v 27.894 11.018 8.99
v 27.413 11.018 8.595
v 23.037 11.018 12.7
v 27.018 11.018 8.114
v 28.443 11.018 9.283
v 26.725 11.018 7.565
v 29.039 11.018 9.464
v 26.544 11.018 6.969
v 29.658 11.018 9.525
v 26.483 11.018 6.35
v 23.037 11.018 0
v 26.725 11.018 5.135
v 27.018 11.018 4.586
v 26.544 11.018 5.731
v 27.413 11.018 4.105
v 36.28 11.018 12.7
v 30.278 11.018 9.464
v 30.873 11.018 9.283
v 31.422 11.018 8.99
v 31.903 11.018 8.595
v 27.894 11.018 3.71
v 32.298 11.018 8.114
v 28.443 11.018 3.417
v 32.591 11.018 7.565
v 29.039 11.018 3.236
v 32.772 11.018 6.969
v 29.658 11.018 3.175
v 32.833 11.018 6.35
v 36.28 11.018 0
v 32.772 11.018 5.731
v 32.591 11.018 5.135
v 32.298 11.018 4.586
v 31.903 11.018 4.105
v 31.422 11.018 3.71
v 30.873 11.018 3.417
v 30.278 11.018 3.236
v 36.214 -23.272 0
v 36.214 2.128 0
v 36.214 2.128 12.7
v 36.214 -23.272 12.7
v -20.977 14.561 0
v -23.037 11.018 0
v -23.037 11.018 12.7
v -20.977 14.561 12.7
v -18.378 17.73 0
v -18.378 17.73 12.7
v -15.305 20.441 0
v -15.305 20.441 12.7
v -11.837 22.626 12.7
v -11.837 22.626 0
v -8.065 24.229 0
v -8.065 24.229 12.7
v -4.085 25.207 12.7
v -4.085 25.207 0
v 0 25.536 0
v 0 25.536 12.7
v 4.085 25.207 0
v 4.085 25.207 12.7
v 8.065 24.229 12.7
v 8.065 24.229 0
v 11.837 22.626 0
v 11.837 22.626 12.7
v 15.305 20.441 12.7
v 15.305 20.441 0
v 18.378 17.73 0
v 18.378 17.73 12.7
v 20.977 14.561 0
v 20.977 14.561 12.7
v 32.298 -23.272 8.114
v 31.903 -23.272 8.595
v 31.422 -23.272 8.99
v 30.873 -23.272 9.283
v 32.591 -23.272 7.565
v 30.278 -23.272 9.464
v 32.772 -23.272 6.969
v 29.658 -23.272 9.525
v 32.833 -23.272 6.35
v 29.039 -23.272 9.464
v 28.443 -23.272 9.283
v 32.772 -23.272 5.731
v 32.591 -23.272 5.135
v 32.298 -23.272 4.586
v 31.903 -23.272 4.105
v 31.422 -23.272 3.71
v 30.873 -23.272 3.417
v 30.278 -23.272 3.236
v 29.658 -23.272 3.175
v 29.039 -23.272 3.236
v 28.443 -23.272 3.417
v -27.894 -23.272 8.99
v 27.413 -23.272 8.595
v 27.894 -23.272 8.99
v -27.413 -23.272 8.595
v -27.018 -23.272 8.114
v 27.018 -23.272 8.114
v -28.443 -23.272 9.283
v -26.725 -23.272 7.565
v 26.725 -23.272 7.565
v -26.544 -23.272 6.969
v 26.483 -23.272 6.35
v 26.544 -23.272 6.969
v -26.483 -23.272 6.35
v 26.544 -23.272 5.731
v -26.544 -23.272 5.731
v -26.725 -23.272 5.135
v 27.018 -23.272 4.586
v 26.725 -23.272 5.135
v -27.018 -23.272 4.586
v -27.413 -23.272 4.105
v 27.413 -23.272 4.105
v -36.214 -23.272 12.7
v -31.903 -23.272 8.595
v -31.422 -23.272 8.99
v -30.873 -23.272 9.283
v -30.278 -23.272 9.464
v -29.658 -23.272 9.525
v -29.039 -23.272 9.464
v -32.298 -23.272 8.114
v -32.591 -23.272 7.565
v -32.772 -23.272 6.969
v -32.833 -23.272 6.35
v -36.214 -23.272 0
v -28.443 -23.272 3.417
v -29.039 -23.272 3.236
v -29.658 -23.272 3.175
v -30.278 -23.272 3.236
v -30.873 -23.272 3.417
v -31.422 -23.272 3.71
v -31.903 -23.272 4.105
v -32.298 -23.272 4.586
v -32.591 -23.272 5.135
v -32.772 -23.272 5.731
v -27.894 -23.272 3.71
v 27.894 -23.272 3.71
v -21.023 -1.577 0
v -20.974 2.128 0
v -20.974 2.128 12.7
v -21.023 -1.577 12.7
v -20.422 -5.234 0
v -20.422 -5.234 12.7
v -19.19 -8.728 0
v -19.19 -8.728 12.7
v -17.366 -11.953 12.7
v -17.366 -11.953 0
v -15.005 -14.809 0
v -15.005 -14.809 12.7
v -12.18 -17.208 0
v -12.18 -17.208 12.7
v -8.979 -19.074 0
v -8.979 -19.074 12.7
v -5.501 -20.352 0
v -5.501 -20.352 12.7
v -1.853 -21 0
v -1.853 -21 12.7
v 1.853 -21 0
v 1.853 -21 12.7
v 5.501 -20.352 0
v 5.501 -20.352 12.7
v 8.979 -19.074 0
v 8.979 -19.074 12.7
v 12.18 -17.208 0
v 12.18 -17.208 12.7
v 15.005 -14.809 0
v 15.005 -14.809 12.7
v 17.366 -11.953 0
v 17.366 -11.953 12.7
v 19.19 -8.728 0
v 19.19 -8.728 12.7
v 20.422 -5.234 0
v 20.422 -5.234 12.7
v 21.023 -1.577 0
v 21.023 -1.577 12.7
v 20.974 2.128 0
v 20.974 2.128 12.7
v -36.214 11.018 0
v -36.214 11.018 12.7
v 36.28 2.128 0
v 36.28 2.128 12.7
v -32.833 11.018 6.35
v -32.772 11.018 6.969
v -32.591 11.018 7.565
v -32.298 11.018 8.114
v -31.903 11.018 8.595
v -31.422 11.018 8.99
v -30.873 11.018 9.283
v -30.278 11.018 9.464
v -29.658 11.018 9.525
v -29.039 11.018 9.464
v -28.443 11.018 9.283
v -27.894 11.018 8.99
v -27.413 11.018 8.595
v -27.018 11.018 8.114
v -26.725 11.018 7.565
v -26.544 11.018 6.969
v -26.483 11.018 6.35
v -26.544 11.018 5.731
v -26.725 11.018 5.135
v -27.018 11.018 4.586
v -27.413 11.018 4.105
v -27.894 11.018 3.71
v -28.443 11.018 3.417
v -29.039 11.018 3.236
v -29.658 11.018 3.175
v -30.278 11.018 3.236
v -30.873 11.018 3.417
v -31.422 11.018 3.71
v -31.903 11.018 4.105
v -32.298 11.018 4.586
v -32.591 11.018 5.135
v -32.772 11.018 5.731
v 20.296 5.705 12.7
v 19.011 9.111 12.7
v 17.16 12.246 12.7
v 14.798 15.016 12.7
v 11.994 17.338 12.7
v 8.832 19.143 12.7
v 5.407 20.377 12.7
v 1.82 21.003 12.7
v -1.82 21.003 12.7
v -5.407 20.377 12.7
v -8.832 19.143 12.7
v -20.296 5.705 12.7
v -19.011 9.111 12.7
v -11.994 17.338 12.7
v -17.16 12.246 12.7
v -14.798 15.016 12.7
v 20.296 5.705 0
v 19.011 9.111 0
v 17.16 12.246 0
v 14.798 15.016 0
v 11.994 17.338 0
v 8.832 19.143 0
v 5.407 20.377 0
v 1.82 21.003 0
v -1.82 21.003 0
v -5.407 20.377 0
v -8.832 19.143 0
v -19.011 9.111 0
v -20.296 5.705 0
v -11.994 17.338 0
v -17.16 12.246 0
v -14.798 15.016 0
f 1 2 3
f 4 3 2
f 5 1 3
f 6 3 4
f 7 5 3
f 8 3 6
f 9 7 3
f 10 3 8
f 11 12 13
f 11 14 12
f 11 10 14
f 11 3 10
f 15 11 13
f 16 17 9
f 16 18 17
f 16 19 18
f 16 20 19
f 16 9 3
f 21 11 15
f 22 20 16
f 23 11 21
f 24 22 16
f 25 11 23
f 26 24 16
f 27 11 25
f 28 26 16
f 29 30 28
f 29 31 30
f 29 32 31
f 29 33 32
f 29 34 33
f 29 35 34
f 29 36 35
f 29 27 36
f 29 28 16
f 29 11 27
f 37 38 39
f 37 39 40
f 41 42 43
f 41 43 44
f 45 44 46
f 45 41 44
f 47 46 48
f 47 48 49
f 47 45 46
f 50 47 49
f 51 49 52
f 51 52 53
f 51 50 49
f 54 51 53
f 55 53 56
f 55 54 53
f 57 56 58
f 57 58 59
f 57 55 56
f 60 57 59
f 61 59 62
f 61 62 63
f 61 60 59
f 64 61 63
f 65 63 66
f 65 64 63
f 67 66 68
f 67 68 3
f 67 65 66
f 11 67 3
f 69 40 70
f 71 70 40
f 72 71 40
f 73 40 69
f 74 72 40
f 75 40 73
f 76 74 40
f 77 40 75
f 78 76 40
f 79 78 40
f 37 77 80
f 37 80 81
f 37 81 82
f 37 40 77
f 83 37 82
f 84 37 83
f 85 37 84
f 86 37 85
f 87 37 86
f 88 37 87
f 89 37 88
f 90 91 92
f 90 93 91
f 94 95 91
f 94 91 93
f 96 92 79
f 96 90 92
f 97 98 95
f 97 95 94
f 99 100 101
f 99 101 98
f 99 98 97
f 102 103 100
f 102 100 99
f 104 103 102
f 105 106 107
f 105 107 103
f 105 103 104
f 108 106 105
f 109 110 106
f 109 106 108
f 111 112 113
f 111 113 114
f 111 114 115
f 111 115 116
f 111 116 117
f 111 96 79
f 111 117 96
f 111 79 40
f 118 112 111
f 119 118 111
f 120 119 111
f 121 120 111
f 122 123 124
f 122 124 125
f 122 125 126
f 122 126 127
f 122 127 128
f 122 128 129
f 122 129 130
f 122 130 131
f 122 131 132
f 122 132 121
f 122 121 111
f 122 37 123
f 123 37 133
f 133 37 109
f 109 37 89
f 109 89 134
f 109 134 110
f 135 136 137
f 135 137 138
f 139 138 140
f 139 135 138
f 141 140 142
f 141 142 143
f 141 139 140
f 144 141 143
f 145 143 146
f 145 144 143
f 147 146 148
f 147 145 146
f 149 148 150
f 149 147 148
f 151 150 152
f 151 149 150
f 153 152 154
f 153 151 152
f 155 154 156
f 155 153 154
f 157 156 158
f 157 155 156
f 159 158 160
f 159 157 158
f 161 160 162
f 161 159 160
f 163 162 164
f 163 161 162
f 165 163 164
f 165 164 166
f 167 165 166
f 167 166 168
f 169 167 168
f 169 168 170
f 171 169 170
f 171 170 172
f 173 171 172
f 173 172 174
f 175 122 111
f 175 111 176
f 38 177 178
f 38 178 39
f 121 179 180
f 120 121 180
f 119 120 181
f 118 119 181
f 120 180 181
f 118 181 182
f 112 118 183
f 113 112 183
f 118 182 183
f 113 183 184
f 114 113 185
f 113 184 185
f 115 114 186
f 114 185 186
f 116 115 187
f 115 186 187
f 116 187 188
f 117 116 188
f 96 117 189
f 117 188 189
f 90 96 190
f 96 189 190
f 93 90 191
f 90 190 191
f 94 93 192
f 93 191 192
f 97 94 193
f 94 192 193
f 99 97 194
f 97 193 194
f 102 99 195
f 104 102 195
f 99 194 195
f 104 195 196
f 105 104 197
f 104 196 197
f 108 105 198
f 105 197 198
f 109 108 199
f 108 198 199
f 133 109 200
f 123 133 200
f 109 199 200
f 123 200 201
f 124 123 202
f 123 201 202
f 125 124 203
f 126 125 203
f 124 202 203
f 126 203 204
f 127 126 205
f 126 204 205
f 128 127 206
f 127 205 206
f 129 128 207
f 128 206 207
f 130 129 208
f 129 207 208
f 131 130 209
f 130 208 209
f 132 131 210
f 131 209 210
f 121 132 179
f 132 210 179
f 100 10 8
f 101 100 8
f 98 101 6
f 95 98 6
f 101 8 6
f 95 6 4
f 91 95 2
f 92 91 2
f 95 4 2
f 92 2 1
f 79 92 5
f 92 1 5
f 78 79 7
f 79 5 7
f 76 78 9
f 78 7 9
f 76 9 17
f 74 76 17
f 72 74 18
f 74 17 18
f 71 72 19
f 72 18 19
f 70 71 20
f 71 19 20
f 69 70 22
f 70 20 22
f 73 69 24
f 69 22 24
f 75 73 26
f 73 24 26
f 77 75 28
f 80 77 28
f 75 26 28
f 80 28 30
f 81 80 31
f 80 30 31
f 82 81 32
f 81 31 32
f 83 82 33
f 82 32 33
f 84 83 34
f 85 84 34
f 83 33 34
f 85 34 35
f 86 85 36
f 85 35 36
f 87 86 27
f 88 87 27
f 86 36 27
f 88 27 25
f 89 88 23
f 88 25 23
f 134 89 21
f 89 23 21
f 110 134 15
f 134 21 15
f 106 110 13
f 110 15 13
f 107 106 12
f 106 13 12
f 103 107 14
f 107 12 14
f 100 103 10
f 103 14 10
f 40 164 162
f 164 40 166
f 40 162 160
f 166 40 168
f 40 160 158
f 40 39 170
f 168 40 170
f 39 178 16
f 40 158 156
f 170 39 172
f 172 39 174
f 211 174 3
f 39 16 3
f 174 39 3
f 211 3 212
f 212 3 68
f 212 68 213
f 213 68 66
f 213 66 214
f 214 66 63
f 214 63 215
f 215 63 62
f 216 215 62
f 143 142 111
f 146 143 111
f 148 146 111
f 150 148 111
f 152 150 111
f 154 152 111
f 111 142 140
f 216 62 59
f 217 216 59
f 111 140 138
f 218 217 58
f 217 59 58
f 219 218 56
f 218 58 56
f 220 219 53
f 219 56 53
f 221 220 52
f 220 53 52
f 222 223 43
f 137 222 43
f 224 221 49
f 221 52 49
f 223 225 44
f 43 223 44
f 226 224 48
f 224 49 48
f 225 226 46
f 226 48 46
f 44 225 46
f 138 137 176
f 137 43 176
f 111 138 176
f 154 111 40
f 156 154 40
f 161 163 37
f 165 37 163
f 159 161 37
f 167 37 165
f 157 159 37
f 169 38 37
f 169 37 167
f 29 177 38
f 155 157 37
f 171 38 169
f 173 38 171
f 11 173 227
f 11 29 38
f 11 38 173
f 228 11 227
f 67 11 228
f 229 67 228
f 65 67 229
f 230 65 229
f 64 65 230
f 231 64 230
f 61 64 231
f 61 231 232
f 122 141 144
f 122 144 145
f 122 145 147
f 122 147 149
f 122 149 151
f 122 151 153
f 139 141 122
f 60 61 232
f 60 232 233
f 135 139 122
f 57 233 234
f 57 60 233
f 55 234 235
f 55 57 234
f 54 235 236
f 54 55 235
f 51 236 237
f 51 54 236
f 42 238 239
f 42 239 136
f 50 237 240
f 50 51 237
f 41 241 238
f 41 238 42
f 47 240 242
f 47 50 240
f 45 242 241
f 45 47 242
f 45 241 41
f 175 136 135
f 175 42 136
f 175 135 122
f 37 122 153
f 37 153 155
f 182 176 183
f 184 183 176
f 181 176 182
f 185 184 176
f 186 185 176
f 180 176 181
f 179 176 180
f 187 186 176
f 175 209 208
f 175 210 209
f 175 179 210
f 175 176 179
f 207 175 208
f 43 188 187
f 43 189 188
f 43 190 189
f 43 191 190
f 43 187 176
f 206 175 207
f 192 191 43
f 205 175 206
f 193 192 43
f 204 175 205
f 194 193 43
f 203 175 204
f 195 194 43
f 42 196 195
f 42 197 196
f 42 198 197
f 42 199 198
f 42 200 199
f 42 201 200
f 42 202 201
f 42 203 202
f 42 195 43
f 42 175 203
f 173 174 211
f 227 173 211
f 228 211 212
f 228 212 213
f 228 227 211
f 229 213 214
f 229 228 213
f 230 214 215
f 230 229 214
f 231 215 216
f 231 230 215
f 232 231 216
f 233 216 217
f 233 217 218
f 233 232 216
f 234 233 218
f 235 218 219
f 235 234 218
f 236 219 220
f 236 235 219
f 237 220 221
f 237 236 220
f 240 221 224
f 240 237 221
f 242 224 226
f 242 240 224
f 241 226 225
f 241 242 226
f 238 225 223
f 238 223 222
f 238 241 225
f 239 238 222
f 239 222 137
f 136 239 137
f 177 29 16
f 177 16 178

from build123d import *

# Parameters (mm, degrees)
BOSS_EXTRUDE1_DEPTH = 12.7
BOSS_EXTRUDE2_DEPTH = 12.7
SKETCH18_R          = 3.175
CUT_EXTRUDE1_DEPTH  = 34.29


with BuildPart() as part:
    # Sketch1 → Boss-Extrude1 (new body)
    with BuildSketch(Plane.XY):
        with BuildLine():
            Line((36.21435187, 2.127742376), (36.21435187, -23.272257624))
            Line((36.21435187, -23.272257624), (-36.21435187, -23.272257624))
            Line((-36.21435187, -23.272257624), (-36.21435187, 2.127742376))
            Line((-36.21435187, 2.127742376), (-20.97435187, 2.127742376))
            ThreePointArc((-20.97435187, 2.127742376), (0, -21.082), (20.97435187, 2.127742376))
            Line((20.97435187, 2.127742376), (36.21435187, 2.127742376))
        make_face()
    extrude(amount=BOSS_EXTRUDE1_DEPTH)

    # Sketch3 → Boss-Extrude2 (add)
    with BuildSketch(Plane.XY):
        with BuildLine():
            Line((-20.97435187, 2.127742376), (-36.21435187, 2.127742376))
            Line((-36.21435187, 2.127742376), (-36.21435187, 11.017742376))
            Line((-36.21435187, 11.017742376), (-23.036618604, 11.017742376))
            ThreePointArc((-23.036618604, 11.017742376), (0, 25.535787511), (23.036618604, 11.017742376))
            Line((23.036618604, 11.017742376), (36.279630177, 11.017742376))
            Line((36.279630177, 11.017742376), (36.279630177, 2.127742376))
            Line((36.279630177, 2.127742376), (20.97435187, 2.127742376))
            ThreePointArc((20.97435187, 2.127742376), (0, 21.082), (-20.97435187, 2.127742376))
        make_face()
    extrude(amount=BOSS_EXTRUDE2_DEPTH)

    # Sketch18 → Cut-Extrude1 (cut)
    with BuildSketch(Plane(origin=(0, 11.017742376, 0), x_dir=(1, 0, 0), z_dir=(0, 1, 0))):
        with Locations(Location((-29.658124391, -6.35, 0), (0, 0, 180))):
            Circle(SKETCH18_R)
        with Locations(Location((29.658124391, -6.35, 0), (0, 0, 180))):
            Circle(SKETCH18_R)
    extrude(amount=-CUT_EXTRUDE1_DEPTH, mode=Mode.SUBTRACT)


solid = part.part
